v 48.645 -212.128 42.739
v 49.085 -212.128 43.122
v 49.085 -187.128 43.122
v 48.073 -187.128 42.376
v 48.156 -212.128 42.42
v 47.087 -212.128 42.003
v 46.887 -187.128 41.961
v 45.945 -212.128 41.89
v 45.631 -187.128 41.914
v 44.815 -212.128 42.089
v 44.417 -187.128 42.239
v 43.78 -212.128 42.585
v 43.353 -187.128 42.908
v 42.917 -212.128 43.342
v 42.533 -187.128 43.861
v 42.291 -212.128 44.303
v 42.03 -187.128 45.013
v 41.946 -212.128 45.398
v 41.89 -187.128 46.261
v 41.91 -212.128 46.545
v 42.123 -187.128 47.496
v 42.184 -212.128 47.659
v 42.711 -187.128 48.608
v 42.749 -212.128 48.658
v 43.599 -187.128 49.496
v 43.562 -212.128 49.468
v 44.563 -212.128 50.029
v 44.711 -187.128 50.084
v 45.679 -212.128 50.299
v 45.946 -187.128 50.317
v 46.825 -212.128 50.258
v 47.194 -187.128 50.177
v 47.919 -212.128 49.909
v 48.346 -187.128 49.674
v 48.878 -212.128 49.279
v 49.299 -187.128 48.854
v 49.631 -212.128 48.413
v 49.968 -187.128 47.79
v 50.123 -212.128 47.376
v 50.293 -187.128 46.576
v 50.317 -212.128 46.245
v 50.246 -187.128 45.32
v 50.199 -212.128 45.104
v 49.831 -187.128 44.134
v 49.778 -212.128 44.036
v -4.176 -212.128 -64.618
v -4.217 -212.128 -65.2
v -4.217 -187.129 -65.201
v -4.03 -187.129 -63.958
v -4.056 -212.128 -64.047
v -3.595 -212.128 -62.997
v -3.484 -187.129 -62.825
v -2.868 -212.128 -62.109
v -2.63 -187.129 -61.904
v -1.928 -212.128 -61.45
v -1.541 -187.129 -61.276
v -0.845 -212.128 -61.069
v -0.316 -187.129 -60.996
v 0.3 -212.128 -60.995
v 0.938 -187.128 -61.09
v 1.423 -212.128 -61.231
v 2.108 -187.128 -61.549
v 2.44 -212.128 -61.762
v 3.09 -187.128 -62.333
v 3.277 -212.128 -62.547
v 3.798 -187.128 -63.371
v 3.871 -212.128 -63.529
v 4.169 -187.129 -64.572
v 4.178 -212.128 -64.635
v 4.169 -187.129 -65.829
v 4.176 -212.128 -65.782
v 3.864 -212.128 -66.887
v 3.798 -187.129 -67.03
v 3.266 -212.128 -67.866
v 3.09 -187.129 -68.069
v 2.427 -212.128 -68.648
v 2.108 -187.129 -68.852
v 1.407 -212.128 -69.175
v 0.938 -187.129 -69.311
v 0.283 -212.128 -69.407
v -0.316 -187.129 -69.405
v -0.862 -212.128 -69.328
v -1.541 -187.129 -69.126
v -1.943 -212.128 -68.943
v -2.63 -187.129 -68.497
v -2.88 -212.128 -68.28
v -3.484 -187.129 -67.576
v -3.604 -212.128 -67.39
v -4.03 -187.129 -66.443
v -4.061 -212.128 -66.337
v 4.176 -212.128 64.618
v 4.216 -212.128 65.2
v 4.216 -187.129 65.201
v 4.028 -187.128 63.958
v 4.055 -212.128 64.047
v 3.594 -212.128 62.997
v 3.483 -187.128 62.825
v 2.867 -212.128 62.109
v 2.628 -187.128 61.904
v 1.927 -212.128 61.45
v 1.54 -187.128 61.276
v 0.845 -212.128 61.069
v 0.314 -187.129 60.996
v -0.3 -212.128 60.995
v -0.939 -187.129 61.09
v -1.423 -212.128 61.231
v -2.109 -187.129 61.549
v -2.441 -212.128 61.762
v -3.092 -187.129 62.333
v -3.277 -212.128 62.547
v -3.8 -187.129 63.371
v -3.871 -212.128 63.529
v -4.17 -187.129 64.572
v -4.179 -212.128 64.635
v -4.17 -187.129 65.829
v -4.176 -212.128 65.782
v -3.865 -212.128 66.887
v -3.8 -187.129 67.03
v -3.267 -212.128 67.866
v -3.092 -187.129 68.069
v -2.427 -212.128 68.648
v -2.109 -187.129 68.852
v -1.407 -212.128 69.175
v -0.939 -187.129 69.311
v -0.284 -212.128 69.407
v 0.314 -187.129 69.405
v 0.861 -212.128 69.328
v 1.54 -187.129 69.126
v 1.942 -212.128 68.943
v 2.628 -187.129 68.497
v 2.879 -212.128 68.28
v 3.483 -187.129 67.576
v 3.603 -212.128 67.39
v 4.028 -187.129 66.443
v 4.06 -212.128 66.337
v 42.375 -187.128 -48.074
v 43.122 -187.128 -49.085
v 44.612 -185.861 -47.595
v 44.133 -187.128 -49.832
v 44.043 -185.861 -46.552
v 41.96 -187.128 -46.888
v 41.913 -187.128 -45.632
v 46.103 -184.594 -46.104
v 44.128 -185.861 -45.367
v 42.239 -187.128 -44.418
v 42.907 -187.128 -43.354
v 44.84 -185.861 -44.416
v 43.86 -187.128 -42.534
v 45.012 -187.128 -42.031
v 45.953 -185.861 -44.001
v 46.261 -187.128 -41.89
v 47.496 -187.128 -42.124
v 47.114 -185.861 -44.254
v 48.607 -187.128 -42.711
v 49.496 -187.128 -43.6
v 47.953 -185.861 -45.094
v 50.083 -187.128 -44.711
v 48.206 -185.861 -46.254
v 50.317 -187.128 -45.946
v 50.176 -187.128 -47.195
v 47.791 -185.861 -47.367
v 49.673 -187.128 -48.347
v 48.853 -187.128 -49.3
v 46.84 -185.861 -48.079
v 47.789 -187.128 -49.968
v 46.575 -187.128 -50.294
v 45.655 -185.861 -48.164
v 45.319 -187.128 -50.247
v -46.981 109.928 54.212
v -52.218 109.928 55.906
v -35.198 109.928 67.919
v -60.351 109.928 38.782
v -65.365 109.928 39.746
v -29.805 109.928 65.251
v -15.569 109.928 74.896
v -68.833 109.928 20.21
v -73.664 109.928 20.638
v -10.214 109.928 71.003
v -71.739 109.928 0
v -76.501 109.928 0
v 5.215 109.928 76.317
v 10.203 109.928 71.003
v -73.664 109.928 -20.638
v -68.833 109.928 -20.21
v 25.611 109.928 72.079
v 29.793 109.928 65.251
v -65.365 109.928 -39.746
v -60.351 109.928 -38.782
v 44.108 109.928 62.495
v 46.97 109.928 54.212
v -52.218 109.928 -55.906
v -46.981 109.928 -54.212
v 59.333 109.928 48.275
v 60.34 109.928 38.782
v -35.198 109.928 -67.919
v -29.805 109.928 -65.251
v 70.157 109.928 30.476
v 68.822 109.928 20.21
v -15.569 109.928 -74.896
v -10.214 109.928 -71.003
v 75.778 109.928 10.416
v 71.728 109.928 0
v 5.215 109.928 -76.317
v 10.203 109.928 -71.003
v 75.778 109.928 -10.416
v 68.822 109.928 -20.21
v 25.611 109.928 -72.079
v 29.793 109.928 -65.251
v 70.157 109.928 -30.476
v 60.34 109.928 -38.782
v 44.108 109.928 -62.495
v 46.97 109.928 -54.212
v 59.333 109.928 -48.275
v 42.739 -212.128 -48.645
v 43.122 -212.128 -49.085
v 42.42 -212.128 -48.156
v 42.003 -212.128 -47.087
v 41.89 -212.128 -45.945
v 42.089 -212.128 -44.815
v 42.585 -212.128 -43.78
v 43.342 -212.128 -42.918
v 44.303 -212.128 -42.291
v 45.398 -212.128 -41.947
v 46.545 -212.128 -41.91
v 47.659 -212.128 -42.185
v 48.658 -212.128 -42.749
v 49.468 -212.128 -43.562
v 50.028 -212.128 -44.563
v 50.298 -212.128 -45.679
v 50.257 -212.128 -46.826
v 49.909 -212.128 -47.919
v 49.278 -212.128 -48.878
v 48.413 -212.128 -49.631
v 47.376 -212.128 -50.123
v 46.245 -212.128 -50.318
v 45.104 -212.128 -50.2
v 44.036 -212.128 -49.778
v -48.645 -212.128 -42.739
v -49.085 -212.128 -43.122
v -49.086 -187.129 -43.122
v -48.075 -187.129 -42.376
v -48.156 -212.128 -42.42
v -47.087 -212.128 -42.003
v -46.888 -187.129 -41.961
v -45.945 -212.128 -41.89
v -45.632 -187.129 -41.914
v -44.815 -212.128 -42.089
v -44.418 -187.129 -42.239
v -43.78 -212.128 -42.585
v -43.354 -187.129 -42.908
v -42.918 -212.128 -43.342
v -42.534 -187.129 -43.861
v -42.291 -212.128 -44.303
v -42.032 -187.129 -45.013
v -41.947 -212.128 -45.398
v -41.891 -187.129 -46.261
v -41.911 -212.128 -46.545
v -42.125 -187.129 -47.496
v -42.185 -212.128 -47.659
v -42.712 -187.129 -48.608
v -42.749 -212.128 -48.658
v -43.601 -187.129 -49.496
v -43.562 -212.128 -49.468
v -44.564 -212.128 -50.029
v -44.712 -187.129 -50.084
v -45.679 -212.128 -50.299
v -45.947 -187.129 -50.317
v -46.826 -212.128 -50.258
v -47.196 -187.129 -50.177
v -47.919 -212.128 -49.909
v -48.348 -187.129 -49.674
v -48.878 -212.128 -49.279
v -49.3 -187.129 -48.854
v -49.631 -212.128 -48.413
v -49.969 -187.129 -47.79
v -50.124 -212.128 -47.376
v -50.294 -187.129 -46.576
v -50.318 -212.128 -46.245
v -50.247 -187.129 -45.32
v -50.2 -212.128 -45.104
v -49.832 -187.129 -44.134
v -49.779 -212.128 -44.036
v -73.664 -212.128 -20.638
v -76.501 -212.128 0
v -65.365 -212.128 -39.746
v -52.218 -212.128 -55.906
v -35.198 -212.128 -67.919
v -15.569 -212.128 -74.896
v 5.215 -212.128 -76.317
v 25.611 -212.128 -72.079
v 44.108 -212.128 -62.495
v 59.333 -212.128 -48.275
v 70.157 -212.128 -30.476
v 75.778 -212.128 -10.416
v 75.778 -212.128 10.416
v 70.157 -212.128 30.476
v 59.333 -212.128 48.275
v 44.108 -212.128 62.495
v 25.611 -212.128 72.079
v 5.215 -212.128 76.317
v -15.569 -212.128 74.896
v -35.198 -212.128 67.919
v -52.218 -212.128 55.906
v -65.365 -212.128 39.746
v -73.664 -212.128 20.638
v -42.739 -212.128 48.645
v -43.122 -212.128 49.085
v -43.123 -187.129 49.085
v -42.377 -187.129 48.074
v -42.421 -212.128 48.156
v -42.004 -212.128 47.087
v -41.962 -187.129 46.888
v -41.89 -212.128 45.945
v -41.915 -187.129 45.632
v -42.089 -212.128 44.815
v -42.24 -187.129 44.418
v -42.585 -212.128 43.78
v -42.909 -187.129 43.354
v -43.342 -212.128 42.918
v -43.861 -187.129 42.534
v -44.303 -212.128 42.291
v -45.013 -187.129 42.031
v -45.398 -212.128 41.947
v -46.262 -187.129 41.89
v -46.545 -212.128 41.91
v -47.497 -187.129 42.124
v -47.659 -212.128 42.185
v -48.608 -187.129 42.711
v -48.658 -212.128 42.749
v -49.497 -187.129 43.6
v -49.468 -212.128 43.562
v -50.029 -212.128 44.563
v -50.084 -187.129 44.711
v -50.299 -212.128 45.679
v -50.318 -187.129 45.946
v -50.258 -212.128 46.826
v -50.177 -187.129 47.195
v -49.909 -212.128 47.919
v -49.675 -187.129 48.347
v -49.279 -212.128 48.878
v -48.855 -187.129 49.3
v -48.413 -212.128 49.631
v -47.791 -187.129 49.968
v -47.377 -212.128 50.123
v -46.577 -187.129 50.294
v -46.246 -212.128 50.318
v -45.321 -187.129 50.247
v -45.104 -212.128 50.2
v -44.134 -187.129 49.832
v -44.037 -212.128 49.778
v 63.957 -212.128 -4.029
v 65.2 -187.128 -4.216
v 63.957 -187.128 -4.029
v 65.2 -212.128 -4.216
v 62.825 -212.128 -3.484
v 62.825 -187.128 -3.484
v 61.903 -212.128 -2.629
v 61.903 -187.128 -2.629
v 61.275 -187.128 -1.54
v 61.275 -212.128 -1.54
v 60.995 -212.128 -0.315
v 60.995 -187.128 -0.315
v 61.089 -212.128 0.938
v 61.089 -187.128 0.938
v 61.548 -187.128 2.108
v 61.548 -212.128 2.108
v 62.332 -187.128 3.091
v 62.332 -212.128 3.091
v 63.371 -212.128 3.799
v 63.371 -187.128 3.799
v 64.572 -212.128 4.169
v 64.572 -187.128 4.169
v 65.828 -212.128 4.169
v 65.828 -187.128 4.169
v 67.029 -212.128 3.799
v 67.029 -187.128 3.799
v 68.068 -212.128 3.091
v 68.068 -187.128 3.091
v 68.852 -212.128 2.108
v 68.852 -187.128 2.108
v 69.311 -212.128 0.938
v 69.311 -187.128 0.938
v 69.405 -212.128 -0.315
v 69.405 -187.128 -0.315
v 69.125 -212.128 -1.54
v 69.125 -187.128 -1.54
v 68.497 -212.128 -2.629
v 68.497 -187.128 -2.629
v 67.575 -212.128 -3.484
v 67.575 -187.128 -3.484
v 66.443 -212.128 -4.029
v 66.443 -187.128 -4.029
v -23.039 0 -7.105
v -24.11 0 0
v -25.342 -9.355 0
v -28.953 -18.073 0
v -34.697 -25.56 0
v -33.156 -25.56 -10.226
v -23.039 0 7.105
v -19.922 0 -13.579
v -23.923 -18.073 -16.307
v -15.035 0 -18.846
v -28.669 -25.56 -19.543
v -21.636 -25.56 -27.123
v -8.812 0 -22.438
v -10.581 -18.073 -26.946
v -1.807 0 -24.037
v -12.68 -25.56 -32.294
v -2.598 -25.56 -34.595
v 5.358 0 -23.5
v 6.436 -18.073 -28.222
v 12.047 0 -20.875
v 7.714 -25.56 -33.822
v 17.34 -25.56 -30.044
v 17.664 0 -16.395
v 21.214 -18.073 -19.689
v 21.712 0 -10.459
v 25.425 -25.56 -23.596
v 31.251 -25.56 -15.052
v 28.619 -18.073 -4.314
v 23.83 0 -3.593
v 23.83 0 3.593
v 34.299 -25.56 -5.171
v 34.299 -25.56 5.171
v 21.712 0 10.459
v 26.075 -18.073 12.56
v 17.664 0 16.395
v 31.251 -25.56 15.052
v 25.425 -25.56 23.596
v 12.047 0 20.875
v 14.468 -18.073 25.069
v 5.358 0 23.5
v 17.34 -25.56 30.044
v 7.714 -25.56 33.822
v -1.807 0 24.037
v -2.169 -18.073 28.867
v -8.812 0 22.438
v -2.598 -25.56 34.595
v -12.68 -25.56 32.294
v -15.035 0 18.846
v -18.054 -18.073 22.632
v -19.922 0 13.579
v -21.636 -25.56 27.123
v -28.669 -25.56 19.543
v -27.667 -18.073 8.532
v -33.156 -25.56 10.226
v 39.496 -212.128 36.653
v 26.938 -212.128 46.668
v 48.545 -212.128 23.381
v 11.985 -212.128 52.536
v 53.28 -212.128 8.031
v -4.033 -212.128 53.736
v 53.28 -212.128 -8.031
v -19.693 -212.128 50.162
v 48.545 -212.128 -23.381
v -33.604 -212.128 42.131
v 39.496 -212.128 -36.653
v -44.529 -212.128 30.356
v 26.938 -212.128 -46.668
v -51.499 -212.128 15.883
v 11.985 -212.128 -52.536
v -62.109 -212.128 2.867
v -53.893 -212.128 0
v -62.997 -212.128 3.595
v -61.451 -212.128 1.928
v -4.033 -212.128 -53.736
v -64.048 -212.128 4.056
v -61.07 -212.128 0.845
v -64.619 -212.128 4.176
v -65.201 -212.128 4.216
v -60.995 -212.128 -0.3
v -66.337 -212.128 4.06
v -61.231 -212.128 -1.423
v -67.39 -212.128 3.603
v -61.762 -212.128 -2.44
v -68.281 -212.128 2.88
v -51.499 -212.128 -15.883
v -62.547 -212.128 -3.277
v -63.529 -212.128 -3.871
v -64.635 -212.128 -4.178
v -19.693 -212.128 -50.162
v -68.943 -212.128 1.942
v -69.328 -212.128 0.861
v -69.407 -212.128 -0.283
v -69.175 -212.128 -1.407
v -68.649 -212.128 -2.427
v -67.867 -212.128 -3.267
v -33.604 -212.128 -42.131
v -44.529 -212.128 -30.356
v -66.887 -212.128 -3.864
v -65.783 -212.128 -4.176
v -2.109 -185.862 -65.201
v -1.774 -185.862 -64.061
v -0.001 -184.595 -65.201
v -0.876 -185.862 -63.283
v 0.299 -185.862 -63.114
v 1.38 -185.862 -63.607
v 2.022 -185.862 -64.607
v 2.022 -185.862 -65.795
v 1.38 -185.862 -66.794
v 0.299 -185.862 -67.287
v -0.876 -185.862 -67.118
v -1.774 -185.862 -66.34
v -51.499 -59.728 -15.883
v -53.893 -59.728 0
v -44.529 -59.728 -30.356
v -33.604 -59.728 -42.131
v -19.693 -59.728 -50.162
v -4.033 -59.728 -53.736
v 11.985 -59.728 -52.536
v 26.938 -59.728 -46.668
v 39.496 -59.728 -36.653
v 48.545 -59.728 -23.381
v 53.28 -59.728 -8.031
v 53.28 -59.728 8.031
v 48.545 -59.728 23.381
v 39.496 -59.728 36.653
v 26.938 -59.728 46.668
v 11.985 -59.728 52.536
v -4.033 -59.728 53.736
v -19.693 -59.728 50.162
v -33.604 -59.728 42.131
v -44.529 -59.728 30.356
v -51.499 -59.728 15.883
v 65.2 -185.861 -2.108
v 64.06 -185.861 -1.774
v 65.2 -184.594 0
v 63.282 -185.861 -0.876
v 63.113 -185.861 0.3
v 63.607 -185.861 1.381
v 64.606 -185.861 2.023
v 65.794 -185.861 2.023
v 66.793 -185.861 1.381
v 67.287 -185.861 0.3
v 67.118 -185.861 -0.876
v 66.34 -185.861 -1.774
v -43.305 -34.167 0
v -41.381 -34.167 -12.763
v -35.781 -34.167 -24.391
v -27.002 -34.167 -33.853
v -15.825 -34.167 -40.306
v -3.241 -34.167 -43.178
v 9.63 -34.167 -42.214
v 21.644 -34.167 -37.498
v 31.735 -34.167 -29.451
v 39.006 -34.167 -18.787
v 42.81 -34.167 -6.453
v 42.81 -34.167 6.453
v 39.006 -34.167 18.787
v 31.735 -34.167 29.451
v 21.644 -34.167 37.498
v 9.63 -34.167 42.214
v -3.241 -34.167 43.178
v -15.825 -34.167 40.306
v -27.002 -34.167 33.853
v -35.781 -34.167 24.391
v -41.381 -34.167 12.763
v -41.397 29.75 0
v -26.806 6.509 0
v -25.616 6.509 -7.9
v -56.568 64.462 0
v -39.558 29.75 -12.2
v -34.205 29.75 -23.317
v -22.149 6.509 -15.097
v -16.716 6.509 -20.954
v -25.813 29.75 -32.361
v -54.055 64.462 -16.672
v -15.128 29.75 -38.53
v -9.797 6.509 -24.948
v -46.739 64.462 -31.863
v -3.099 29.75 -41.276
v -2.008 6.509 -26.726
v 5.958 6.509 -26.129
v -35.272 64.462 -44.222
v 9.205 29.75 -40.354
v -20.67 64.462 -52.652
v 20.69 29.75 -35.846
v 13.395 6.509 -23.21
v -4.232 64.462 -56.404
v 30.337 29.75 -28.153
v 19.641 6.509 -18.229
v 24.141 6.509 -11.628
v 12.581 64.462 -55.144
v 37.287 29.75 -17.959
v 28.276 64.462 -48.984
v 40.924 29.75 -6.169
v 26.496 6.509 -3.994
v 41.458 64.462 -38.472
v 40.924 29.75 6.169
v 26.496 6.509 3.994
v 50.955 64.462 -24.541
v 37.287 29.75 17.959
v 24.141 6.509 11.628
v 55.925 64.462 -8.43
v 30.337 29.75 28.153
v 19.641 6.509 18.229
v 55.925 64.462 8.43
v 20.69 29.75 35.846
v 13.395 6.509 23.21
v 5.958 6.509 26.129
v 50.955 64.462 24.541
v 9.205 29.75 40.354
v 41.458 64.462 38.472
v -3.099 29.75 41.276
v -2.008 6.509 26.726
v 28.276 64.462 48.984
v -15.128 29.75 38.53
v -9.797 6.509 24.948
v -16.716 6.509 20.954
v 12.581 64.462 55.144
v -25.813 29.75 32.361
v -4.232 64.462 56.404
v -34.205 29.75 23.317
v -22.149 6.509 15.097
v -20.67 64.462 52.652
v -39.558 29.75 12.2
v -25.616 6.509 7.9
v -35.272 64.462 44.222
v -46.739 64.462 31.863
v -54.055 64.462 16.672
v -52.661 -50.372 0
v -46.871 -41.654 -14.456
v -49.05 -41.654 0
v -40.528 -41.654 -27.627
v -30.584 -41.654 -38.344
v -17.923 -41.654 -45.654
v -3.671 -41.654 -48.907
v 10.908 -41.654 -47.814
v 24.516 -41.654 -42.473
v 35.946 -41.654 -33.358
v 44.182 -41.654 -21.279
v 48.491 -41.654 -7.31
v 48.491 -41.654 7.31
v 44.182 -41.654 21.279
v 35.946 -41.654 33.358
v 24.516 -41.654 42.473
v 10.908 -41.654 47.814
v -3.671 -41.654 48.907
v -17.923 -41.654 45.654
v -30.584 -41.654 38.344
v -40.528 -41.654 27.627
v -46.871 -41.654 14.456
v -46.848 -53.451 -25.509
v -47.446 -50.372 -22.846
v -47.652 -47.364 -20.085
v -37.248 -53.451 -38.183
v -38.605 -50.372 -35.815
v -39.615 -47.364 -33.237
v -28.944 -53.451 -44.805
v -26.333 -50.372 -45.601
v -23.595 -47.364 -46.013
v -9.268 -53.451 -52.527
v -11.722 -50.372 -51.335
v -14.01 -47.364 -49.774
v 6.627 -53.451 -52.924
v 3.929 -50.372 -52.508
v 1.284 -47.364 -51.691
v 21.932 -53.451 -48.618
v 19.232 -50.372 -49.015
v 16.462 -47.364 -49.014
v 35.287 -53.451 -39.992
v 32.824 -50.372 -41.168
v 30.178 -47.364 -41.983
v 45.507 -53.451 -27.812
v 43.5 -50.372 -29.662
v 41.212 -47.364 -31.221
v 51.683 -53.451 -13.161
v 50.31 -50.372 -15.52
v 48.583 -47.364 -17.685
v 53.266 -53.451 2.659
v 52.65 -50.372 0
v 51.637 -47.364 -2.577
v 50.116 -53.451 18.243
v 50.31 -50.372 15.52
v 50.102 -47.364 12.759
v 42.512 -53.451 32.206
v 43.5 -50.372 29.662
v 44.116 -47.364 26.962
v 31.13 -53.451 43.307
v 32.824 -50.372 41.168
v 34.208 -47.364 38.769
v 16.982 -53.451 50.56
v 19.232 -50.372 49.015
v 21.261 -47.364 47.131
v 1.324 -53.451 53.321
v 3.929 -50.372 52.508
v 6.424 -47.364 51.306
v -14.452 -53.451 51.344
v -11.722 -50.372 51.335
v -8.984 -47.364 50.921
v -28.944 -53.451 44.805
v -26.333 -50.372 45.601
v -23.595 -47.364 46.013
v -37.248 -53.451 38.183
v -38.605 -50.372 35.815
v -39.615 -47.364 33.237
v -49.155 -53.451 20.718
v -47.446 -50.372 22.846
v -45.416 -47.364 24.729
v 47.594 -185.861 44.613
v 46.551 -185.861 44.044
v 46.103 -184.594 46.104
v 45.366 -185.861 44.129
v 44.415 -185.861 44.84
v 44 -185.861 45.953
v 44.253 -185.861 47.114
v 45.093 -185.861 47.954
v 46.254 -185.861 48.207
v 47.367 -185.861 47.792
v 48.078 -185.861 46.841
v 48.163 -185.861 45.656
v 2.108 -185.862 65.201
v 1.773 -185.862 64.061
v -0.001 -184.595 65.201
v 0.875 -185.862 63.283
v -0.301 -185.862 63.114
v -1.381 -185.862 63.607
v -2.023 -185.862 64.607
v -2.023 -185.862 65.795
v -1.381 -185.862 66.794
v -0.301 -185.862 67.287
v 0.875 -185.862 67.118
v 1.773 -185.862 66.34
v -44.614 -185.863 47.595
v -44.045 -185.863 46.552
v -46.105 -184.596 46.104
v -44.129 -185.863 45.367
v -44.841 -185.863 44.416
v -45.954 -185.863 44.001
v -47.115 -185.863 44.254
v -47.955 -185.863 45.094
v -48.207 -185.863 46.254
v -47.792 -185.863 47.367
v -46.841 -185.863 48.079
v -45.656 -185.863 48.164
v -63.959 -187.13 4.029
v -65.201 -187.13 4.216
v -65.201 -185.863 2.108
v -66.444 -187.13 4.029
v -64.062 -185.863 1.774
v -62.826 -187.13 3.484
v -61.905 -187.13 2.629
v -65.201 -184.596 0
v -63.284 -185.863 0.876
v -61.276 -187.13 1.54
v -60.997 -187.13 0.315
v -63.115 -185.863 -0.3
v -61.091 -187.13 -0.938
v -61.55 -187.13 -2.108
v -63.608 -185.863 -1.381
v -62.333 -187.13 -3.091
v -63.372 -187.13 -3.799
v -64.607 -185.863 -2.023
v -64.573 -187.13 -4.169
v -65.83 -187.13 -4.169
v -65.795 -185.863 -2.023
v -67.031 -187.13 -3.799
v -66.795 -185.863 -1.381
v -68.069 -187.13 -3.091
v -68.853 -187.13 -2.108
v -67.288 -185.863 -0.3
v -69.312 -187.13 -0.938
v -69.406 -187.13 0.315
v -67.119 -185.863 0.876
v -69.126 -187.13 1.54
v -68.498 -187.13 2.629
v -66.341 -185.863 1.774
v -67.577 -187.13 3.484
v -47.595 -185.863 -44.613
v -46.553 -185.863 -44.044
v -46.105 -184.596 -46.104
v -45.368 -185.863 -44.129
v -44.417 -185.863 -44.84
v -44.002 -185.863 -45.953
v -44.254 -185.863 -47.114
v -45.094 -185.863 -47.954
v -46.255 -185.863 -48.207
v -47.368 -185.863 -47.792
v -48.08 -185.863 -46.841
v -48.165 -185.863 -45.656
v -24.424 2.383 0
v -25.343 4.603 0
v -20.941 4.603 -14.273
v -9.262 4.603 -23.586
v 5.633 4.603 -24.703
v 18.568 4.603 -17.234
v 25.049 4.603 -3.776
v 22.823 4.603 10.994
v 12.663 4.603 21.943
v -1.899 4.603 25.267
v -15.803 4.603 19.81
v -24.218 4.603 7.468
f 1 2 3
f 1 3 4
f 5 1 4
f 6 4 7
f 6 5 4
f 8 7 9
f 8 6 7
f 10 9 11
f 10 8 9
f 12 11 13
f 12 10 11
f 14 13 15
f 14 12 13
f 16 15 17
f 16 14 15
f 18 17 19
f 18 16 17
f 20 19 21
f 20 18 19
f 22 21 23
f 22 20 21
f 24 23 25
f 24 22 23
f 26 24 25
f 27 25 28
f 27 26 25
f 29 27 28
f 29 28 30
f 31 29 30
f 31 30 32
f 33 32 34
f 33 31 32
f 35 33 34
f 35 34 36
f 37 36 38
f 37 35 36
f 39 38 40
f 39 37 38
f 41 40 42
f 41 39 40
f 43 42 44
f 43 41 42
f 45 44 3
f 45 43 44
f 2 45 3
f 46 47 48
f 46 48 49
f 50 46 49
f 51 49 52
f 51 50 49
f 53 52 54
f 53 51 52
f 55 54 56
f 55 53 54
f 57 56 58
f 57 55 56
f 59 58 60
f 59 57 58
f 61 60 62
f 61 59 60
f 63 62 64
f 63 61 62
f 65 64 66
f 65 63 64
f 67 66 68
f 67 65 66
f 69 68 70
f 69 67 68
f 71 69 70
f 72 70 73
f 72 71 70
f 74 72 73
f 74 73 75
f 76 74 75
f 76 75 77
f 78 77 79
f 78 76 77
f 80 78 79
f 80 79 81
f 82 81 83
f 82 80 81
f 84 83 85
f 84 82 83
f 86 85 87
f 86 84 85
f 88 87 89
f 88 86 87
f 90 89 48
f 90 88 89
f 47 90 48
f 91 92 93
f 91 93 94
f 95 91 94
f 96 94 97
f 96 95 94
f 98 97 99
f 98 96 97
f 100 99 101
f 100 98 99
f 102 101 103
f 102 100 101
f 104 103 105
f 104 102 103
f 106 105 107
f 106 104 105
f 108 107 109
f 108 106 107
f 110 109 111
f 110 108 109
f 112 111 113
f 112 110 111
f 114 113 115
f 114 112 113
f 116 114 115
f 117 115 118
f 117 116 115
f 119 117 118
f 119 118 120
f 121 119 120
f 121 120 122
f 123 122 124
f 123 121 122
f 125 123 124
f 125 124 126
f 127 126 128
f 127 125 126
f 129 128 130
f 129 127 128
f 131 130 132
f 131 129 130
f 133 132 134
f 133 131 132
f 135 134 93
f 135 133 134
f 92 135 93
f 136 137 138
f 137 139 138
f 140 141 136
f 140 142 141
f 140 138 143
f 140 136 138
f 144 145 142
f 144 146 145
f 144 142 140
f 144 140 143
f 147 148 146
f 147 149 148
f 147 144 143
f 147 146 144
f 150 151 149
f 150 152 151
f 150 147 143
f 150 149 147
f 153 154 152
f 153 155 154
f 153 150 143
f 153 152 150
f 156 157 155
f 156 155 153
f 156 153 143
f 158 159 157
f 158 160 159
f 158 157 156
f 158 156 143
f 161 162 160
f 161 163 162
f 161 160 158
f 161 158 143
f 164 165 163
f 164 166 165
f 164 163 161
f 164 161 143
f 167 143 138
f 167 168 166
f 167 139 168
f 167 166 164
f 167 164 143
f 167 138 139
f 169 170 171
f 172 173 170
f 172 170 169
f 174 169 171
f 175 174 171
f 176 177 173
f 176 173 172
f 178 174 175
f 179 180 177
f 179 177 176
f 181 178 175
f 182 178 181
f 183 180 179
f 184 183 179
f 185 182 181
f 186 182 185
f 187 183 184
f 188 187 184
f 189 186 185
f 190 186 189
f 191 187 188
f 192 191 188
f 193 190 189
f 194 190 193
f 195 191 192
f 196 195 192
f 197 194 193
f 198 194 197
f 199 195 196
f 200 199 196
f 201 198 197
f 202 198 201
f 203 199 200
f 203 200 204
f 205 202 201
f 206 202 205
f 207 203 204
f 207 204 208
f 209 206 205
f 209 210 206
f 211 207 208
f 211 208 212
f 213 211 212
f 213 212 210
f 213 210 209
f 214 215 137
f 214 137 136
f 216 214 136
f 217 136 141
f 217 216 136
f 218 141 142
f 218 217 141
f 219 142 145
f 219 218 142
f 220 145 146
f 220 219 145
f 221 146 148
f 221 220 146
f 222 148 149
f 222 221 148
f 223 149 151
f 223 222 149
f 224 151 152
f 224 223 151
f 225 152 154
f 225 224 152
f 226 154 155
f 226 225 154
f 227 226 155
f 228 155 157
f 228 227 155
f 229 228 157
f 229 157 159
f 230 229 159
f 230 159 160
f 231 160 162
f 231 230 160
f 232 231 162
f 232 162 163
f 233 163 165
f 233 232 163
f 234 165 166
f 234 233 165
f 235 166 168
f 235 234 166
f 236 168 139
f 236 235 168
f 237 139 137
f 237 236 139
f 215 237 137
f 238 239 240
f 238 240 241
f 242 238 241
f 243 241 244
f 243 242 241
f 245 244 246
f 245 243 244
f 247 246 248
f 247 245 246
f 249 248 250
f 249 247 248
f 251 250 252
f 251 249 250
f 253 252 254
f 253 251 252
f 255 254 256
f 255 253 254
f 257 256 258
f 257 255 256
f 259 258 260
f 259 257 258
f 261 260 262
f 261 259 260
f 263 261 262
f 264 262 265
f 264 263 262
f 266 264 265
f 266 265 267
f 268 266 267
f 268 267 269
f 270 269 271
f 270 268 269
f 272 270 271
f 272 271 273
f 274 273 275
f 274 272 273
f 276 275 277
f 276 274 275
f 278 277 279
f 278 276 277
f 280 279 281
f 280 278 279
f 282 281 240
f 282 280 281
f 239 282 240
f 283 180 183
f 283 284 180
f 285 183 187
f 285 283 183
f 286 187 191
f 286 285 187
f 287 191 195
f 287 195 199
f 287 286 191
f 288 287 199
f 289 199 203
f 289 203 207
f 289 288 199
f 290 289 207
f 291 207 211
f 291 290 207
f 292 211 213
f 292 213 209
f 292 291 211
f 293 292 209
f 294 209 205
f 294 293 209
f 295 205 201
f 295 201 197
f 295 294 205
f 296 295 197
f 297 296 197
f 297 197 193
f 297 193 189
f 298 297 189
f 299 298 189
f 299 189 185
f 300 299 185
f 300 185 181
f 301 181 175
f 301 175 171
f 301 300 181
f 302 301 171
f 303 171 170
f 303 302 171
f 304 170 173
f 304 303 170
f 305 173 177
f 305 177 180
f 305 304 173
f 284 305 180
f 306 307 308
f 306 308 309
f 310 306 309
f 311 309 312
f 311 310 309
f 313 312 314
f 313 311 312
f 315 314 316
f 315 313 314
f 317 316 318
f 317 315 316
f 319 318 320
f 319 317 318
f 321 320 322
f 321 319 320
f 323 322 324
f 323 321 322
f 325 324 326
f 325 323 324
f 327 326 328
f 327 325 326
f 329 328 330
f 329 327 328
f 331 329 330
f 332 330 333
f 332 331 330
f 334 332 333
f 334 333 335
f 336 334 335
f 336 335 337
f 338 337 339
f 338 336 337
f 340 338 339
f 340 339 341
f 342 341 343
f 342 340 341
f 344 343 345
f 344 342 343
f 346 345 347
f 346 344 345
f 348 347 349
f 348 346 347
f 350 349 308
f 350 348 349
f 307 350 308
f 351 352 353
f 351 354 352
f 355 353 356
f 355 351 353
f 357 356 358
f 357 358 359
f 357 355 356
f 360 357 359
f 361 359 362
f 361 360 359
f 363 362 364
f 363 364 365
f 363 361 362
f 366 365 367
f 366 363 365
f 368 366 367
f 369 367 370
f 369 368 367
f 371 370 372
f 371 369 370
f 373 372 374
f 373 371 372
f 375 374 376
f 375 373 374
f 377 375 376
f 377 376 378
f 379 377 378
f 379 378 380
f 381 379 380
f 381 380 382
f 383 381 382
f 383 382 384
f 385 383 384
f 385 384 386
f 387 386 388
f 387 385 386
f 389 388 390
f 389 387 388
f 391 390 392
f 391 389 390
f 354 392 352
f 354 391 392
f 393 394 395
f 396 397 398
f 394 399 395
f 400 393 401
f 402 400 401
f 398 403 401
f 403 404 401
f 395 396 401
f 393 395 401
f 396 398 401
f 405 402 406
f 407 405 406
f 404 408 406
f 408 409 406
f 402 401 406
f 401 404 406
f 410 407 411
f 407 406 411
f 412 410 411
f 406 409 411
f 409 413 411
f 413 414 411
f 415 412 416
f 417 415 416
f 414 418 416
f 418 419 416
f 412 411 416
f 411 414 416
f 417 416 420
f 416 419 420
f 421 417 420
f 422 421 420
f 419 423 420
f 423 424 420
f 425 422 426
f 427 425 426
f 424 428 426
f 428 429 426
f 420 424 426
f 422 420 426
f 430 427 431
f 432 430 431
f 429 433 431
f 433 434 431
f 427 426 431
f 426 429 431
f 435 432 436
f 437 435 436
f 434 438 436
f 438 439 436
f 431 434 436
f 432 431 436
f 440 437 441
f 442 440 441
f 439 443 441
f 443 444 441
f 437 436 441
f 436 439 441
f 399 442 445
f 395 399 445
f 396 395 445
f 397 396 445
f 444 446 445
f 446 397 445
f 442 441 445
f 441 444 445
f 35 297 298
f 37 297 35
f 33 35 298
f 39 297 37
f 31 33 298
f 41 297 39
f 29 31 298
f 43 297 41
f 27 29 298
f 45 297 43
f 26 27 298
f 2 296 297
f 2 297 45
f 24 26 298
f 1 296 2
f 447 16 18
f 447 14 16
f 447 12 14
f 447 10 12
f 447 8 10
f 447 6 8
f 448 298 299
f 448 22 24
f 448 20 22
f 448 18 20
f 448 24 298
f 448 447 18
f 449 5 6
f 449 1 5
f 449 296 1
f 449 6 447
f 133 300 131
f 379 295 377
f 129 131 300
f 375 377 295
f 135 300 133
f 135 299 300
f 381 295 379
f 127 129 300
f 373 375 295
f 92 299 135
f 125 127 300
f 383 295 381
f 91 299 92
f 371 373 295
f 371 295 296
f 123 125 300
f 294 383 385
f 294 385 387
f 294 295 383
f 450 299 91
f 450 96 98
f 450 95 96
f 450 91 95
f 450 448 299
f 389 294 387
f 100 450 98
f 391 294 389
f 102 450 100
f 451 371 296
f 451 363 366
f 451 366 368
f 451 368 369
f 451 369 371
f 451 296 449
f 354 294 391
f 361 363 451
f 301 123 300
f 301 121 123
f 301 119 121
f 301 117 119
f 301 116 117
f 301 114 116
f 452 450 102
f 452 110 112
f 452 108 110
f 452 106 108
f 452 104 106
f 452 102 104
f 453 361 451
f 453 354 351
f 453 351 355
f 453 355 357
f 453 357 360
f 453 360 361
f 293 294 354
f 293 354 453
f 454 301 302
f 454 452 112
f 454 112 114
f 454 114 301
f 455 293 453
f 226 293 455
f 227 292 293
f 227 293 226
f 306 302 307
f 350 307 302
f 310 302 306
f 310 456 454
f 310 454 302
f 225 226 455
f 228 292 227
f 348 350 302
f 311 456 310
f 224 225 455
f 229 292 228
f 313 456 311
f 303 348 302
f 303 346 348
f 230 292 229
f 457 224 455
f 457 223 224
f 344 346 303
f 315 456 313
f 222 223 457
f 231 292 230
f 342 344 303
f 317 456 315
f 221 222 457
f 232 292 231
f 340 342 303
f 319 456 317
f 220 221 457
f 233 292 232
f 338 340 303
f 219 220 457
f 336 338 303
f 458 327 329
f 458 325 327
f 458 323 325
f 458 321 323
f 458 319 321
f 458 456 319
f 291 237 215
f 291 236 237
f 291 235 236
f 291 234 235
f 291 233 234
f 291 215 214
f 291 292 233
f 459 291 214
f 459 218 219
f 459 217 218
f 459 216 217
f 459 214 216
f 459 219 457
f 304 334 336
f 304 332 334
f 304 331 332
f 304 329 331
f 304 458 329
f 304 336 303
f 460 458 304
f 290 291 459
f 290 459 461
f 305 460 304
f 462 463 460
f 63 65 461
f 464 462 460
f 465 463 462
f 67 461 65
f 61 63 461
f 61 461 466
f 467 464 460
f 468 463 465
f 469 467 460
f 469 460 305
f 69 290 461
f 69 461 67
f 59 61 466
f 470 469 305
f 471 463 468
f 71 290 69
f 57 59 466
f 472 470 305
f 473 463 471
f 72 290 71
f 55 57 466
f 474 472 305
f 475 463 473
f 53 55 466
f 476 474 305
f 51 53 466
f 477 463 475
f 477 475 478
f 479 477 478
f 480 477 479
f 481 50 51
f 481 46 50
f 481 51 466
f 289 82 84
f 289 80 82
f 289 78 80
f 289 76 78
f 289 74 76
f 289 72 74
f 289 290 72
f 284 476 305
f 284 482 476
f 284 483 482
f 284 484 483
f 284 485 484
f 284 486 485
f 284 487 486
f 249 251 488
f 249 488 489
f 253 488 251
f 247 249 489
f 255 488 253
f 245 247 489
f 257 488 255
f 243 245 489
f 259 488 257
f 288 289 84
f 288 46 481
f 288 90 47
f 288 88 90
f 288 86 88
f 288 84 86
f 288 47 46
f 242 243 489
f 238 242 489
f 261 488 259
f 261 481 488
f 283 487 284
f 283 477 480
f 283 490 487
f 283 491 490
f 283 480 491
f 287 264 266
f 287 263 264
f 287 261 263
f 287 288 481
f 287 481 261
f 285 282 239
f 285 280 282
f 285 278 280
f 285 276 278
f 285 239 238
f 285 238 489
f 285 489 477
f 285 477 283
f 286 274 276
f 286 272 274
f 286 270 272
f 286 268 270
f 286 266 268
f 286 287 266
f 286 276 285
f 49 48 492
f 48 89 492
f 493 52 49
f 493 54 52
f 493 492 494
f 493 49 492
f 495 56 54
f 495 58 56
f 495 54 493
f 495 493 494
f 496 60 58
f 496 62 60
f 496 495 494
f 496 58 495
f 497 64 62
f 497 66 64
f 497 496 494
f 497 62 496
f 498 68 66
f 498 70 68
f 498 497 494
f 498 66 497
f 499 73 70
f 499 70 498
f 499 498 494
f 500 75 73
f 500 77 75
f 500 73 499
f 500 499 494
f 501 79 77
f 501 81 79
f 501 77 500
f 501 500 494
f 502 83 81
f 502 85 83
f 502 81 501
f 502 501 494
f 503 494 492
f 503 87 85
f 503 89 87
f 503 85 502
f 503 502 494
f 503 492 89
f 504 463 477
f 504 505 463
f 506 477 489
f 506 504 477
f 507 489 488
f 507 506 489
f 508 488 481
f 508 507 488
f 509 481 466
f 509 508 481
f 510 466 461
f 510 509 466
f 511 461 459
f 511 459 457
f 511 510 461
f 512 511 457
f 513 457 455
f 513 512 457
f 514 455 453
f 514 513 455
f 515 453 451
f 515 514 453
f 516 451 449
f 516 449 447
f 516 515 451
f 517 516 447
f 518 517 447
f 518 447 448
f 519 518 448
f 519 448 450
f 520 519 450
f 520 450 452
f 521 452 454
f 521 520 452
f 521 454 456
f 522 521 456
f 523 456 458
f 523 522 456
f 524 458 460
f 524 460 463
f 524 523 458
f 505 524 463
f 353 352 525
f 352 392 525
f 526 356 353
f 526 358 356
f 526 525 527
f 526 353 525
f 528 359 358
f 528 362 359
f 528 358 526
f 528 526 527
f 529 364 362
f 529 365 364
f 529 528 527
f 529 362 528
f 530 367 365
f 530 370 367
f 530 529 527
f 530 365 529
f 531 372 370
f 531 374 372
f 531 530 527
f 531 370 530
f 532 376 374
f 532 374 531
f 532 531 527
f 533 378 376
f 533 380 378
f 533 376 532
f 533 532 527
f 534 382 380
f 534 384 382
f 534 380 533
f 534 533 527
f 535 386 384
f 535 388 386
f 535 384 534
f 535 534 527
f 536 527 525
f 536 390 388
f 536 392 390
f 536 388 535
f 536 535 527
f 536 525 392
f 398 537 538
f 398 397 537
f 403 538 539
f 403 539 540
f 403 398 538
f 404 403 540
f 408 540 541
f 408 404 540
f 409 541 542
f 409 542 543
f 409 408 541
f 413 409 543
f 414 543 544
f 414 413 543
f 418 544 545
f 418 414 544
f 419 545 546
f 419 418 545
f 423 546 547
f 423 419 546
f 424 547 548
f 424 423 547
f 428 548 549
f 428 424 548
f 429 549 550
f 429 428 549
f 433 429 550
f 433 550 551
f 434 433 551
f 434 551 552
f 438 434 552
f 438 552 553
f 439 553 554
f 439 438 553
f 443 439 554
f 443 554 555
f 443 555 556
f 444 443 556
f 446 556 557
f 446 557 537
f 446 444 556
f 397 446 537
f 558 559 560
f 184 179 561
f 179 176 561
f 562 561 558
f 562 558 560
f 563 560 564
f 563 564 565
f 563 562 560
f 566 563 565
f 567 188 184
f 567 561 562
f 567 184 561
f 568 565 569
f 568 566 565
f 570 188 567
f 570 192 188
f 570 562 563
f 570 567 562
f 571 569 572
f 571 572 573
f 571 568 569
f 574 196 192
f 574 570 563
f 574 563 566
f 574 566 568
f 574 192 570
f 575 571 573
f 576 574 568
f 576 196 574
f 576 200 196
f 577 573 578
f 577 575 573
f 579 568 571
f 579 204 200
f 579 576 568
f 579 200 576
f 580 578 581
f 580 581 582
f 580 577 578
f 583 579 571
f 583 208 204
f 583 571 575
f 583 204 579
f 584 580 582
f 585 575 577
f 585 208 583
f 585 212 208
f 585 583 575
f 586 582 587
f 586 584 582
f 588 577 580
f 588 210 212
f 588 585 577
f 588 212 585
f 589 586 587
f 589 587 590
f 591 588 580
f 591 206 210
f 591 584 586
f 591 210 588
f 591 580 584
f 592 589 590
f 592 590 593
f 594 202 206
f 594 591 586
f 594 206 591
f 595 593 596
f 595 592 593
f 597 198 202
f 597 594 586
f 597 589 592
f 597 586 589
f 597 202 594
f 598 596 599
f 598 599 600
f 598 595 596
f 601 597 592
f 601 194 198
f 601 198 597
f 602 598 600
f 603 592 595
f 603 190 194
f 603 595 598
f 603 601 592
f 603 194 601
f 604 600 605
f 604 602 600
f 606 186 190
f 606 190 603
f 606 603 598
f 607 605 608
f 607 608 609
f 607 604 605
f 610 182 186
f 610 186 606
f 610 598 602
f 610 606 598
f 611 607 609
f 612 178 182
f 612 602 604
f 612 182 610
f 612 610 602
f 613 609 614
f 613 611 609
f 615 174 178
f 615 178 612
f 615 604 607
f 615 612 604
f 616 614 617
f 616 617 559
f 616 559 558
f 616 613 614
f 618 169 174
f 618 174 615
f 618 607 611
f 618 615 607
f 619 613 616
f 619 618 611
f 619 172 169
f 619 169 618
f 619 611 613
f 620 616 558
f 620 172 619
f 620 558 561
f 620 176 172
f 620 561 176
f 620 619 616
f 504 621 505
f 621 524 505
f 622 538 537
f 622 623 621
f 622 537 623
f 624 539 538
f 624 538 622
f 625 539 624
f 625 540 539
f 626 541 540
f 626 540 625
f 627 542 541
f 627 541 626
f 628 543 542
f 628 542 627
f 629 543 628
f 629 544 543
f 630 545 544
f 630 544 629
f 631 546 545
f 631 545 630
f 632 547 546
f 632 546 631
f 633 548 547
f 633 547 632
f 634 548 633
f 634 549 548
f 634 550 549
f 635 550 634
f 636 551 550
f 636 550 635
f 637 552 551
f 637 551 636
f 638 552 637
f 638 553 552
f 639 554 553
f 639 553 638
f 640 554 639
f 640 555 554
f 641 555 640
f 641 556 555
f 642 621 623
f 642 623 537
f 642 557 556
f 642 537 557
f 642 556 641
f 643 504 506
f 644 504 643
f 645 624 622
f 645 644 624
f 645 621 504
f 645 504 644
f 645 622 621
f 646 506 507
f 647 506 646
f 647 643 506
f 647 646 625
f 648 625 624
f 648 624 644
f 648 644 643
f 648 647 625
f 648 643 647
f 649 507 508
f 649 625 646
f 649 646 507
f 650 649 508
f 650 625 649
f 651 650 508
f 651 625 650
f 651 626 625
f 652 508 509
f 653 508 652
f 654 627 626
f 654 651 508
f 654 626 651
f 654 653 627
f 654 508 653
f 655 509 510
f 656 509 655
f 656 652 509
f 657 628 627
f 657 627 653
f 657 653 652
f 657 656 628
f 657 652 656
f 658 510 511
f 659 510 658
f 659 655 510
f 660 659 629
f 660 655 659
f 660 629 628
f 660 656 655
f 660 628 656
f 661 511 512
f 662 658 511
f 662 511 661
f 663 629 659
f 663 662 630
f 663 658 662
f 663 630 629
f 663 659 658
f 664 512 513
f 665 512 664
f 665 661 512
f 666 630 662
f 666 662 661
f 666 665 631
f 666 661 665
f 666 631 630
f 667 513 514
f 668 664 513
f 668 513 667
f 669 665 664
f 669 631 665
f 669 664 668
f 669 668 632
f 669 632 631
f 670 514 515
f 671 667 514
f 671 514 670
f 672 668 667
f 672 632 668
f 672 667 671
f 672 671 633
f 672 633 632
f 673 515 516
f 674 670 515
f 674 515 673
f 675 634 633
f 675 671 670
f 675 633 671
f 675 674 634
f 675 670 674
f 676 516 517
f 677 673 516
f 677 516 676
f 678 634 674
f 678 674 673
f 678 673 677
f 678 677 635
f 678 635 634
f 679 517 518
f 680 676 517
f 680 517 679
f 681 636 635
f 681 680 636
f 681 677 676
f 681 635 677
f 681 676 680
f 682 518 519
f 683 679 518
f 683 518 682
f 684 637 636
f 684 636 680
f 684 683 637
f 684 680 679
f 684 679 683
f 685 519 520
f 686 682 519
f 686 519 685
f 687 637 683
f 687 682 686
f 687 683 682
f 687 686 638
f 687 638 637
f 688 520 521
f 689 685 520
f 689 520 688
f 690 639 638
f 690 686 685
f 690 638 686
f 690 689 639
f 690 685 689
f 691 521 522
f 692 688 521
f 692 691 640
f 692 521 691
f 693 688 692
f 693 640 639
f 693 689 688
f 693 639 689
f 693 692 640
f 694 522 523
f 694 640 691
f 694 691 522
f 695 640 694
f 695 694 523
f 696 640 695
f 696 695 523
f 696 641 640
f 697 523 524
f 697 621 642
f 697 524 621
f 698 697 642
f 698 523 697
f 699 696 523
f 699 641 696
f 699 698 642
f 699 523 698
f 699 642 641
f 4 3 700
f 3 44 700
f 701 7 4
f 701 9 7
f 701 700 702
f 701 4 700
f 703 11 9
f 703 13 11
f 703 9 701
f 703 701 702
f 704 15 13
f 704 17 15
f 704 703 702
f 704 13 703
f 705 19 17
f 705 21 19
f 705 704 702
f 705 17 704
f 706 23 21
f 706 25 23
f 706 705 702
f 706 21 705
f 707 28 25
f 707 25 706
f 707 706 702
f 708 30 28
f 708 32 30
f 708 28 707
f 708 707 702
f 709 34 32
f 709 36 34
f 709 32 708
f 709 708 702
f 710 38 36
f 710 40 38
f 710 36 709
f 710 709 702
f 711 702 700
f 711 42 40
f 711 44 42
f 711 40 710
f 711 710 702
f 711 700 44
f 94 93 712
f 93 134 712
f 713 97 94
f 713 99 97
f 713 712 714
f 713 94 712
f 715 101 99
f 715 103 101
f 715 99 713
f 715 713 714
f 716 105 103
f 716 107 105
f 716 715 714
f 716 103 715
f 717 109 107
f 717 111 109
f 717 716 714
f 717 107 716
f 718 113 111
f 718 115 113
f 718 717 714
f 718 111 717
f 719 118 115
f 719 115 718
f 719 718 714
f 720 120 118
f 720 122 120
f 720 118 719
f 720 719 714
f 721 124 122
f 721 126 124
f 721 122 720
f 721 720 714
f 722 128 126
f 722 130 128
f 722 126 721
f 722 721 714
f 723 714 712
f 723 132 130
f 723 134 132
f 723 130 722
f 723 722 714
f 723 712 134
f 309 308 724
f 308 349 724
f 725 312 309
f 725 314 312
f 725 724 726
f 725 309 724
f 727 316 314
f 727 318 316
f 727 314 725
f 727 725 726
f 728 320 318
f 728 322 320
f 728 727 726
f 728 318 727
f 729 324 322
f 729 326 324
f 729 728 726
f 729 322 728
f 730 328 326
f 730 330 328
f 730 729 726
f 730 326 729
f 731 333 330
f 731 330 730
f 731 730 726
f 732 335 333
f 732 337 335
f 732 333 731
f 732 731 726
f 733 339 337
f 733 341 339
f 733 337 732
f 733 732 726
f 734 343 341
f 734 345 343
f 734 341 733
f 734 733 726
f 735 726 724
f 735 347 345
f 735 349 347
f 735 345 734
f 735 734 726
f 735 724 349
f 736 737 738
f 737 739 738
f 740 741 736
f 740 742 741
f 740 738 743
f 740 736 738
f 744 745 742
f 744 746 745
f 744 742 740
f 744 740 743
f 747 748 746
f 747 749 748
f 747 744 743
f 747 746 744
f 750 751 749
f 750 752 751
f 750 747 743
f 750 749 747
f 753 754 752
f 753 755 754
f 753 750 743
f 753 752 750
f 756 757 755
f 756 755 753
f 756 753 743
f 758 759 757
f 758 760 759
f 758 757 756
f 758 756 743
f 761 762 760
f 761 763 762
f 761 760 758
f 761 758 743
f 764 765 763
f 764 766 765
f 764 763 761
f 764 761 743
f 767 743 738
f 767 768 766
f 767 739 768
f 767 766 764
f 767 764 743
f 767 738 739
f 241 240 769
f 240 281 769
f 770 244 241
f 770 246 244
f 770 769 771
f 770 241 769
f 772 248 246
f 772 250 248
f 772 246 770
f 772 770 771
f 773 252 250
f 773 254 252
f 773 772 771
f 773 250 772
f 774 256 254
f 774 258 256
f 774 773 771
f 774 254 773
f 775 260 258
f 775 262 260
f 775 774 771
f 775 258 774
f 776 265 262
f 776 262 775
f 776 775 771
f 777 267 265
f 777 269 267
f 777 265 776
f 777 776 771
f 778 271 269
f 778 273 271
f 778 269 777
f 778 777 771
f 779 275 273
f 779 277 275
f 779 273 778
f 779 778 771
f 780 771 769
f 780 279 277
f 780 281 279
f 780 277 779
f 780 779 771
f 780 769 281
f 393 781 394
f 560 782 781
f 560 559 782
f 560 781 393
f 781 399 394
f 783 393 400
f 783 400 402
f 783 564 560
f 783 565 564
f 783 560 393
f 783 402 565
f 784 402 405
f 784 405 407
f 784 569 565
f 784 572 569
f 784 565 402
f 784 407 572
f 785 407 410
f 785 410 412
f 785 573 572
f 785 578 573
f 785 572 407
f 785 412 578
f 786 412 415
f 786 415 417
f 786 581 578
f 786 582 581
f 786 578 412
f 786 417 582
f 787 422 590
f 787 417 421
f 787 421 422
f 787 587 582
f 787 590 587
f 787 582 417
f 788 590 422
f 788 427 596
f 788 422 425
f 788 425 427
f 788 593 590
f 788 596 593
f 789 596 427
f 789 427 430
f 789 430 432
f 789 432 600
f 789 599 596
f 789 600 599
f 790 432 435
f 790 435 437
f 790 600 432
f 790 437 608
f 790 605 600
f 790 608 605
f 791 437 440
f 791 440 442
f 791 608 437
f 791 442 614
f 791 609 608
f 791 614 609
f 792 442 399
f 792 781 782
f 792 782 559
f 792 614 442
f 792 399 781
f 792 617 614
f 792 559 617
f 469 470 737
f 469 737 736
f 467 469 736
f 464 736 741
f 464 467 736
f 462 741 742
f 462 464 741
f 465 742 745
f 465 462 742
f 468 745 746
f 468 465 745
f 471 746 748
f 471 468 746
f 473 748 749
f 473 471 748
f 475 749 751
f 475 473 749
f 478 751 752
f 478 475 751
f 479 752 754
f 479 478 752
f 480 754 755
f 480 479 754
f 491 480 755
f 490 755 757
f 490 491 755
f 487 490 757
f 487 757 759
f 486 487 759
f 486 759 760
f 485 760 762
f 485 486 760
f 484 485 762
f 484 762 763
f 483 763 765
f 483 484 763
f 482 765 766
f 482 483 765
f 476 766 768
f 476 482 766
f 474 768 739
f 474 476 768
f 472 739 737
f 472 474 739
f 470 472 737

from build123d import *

# Parameters (mm, degrees)
CIRPATTERN1_COUNT = 8


with BuildPart() as part:
    # Sketch1 → Revolve2 (revolve)
    with BuildSketch(Plane.XY, mode=Mode.PRIVATE) as revolve2_sk:
        with BuildLine():
            Line((71.727523602, 109.927507641), (76.490023602, 109.927507641))
            Line((76.490023602, 109.927507641), (76.490023602, -212.127513222))
            Line((76.490023602, -212.127513222), (53.881527661, -212.127513222))
            Line((53.881527661, -212.127513222), (53.881527661, -59.727513222))
            add(Edge.make_bspline(
                [(53.881527661, -59.727513222), (53.88152643, -59.656983157), (53.880997287, -59.515406103), (53.878621437, -59.181564616), (53.872296838, -58.904795493), (53.862811351, -58.532567488), (53.850168453, -58.212837622), (53.830417626, -57.781594443), (53.800405285, -57.280959899), (53.756193121, -56.687998165), (53.677288452, -55.848480366), (53.577426861, -55.00816586), (53.456675786, -54.17243543), (53.286810822, -53.17242524), (53.092064187, -52.177442821), (52.86637512, -51.188539083), (52.610014224, -50.207489038), (52.32928934, -49.23307774), (52.024348739, -48.265969224), (51.633537831, -47.149135067), (51.139520361, -45.890408405), (50.598733753, -44.650968804), (50.012060928, -43.432701526), (49.380120231, -42.237093239), (48.704125229, -41.066154879), (47.98447552, -39.920972657), (47.223102138, -38.804076239), (46.51986906, -37.851451785), (45.893537937, -37.055672123), (45.352817681, -36.403381282), (44.915126948, -35.894247633), (44.51477619, -35.446992657), (44.181457503, -35.084631185), (43.873924624, -34.760340151), (43.674072407, -34.551549451), (43.444392073, -34.318516288), (43.343783151, -34.217162055), (43.293911001, -34.167289665)],
                knots=[0.082637729, 0.082637729, 0.082637729, 0.082637729, 0.082637729, 0.092574926, 0.102512123, 0.11244932, 0.122386517, 0.132323714, 0.142260911, 0.162135305, 0.182009699, 0.201884093, 0.24163288, 0.261507274, 0.281381668, 0.321130456, 0.360879243, 0.380753637, 0.400628031, 0.440376819, 0.480125606, 0.519874394, 0.559623181, 0.599371969, 0.639120757, 0.678869544, 0.718618332, 0.75836712, 0.798115907, 0.817990301, 0.837864695, 0.857739089, 0.877613483, 0.88755068, 0.897487877, 0.907425074, 0.91736227, 0.91736227, 0.91736227, 0.91736227, 0.91736227], degree=4))
            Line((43.293911001, -34.167289665), (34.686282803, -25.559661468))
            add(Edge.make_bspline(
                [(24.099067874, 0.000160672), (24.099069105, -0.070367974), (24.099598252, -0.213423516), (24.101973937, -0.543022243), (24.108298331, -0.823999723), (24.117783452, -1.194661398), (24.130425744, -1.513274385), (24.146225968, -1.86177893), (24.165181227, -2.193546198), (24.19281884, -2.617908727), (24.232287047, -3.121873274), (24.303299707, -3.879818002), (24.423126678, -4.886289715), (24.599486044, -6.056550088), (24.850885233, -7.385005743), (25.151795313, -8.703413843), (25.501770623, -10.009476538), (25.900360983, -11.301658927), (26.346945392, -12.577938667), (26.841003323, -13.836726817), (27.381673122, -15.076036463), (27.968479386, -16.294449129), (28.600139398, -17.489778131), (29.276532396, -18.661127095), (29.995445102, -19.805582737), (30.758021999, -20.923699417), (31.459167193, -21.874251104), (32.088736123, -22.673284825), (32.624128416, -23.320261484), (33.072255768, -23.839844364), (33.508450026, -24.329655594), (33.935826121, -24.788323739), (34.24555864, -25.11370766), (34.536859958, -25.409488397), (34.636412425, -25.509789283), (34.686282803, -25.559661468)],
                knots=[0.082637729, 0.082637729, 0.082637729, 0.082637729, 0.082637729, 0.092574926, 0.102512123, 0.11244932, 0.122386517, 0.132323714, 0.142260911, 0.152198108, 0.162135305, 0.182009699, 0.201884093, 0.24163288, 0.281381668, 0.321130456, 0.360879243, 0.400628031, 0.440376819, 0.480125606, 0.519874394, 0.559623181, 0.599371969, 0.639120757, 0.678869544, 0.718618332, 0.75836712, 0.798115907, 0.817990301, 0.837864695, 0.857739089, 0.877613483, 0.897487877, 0.907425074, 0.91736227, 0.91736227, 0.91736227, 0.91736227, 0.91736227], degree=4))
            add(Edge.make_bspline(
                [(24.099067874, 0.000160672), (24.0990685, 0.036053324), (24.099606331, 0.110274362), (24.102023723, 0.267801742), (24.108461568, 0.427224789), (24.120533599, 0.646924939), (24.141435087, 0.901594), (24.175184719, 1.202697945), (24.226499305, 1.54221117), (24.290543701, 1.881157449), (24.367141601, 2.216515092), (24.456323571, 2.549400093), (24.557741413, 2.878253317), (24.671619071, 3.203507713), (24.797196771, 3.523787829), (24.935285977, 3.839827405), (25.084070301, 4.149442857), (25.246012222, 4.454943795), (25.416488505, 4.751462248), (25.602514721, 5.045864533), (25.79178827, 5.325679608), (26.004405474, 5.610888215), (26.178876374, 5.83307432), (26.366345756, 6.050112309), (26.504555248, 6.208802318), (26.67044207, 6.382282451), (26.744520261, 6.458639514), (26.795279203, 6.509400323)],
                knots=[0.082568816, 0.082568816, 0.082568816, 0.082568816, 0.082568816, 0.102426634, 0.122284453, 0.142142271, 0.162000089, 0.201715725, 0.241431362, 0.281146998, 0.320862634, 0.360578271, 0.400293907, 0.440009544, 0.47972518, 0.519440816, 0.559156453, 0.598872089, 0.638587725, 0.678303362, 0.718018998, 0.757734635, 0.797450271, 0.837165907, 0.857023726, 0.876881544, 0.91659718, 0.91659718, 0.91659718, 0.91659718, 0.91659718], degree=4))
            add(Edge.make_bspline(
                [(26.795279203, 6.509400323), (49.261401403, 34.636114842), (71.727523602, 109.927507641)],
                knots=[0, 0, 0, 1, 1, 1], degree=2))
        make_face()
    revolve(revolve2_sk.sketch.rotate(Axis((-0.005532126, 165.815985114, 0), (0, -1, 0)), 180), axis=Axis((-0.005532126, 165.815985114, 0), (0, -1, 0)))

    # Sketch4 → 3/8-24 Tapped Hole1 (revolve, cut)
    with BuildSketch(Plane(origin=(65.2, -212.127513222, 0), x_dir=(0, 0, -1), z_dir=(1, 0, 0))):
        Polygon((0, 0), (0, 27.533468714), (4.2164, 25), (4.2164, 0), align=None)
    f_3_8_24_tapped_hole1 = revolve(axis=Axis((65.2, -218.477513222, 0), (0, 1, 0)), mode=Mode.SUBTRACT)

    # CirPattern1: 3/8-24 Tapped Hole1 ×8 about axis
    cirpattern1_axis = Axis((0, -228.487022387, 0), (-1.634718801334702e-05, 0.9999999998663848, 0))
    for i in range(1, CIRPATTERN1_COUNT):
        add(f_3_8_24_tapped_hole1.rotate(cirpattern1_axis, i * 360 / CIRPATTERN1_COUNT), mode=Mode.SUBTRACT)


solid = part.part
